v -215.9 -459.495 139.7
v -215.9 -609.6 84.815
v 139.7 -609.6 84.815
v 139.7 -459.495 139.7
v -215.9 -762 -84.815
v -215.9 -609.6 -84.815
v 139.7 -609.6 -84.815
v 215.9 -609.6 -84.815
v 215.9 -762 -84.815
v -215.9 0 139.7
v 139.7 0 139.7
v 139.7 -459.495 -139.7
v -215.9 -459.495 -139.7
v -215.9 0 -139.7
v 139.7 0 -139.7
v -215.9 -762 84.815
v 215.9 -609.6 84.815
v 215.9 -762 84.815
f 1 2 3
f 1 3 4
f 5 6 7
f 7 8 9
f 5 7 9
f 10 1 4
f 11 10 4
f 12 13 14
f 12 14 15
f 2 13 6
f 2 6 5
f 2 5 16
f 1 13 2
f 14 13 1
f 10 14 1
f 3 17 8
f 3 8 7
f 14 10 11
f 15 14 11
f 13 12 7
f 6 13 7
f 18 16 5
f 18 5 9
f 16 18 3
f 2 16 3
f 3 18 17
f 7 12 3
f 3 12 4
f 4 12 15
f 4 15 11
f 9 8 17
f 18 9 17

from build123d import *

# Parameters (mm, degrees)
F0_W     = 431.8
F0_H     = 279.4
F1_DEPTH = 762
F2_W     = 76.2
F2_H     = 279.4
F3_DEPTH = 609.6
F5_DEPTH = 431.801


with BuildPart() as f1:
    # F0 (on Front) → F1 (new body)
    with BuildSketch(Plane.XZ):
        Rectangle(F0_W, F0_H)
    extrude(amount=F1_DEPTH)

    # F2 (on face) → F3 (cut)
    with BuildSketch(Plane(origin=(0, 0, 0), x_dir=(-1, 0, 0), z_dir=(0, 1, 0))):
        with Locations((-177.8, 0)):
            Rectangle(F2_W, F2_H)
    extrude(amount=-F3_DEPTH, mode=Mode.SUBTRACT)

    # F4 (on face) → F5 (cut, through all)
    with BuildSketch(Plane.YZ.offset(215.9)):
        Polygon((-762, 139.7), (-762, 84.815077), (-609.6, 84.815077), (-457.2, 140.538976), align=None)
        Polygon((-762, -84.815077), (-762, -139.7), (-457.2, -140.538976), (-609.6, -84.815077), align=None)
    extrude(amount=-F5_DEPTH, mode=Mode.SUBTRACT)


solid = f1.part
